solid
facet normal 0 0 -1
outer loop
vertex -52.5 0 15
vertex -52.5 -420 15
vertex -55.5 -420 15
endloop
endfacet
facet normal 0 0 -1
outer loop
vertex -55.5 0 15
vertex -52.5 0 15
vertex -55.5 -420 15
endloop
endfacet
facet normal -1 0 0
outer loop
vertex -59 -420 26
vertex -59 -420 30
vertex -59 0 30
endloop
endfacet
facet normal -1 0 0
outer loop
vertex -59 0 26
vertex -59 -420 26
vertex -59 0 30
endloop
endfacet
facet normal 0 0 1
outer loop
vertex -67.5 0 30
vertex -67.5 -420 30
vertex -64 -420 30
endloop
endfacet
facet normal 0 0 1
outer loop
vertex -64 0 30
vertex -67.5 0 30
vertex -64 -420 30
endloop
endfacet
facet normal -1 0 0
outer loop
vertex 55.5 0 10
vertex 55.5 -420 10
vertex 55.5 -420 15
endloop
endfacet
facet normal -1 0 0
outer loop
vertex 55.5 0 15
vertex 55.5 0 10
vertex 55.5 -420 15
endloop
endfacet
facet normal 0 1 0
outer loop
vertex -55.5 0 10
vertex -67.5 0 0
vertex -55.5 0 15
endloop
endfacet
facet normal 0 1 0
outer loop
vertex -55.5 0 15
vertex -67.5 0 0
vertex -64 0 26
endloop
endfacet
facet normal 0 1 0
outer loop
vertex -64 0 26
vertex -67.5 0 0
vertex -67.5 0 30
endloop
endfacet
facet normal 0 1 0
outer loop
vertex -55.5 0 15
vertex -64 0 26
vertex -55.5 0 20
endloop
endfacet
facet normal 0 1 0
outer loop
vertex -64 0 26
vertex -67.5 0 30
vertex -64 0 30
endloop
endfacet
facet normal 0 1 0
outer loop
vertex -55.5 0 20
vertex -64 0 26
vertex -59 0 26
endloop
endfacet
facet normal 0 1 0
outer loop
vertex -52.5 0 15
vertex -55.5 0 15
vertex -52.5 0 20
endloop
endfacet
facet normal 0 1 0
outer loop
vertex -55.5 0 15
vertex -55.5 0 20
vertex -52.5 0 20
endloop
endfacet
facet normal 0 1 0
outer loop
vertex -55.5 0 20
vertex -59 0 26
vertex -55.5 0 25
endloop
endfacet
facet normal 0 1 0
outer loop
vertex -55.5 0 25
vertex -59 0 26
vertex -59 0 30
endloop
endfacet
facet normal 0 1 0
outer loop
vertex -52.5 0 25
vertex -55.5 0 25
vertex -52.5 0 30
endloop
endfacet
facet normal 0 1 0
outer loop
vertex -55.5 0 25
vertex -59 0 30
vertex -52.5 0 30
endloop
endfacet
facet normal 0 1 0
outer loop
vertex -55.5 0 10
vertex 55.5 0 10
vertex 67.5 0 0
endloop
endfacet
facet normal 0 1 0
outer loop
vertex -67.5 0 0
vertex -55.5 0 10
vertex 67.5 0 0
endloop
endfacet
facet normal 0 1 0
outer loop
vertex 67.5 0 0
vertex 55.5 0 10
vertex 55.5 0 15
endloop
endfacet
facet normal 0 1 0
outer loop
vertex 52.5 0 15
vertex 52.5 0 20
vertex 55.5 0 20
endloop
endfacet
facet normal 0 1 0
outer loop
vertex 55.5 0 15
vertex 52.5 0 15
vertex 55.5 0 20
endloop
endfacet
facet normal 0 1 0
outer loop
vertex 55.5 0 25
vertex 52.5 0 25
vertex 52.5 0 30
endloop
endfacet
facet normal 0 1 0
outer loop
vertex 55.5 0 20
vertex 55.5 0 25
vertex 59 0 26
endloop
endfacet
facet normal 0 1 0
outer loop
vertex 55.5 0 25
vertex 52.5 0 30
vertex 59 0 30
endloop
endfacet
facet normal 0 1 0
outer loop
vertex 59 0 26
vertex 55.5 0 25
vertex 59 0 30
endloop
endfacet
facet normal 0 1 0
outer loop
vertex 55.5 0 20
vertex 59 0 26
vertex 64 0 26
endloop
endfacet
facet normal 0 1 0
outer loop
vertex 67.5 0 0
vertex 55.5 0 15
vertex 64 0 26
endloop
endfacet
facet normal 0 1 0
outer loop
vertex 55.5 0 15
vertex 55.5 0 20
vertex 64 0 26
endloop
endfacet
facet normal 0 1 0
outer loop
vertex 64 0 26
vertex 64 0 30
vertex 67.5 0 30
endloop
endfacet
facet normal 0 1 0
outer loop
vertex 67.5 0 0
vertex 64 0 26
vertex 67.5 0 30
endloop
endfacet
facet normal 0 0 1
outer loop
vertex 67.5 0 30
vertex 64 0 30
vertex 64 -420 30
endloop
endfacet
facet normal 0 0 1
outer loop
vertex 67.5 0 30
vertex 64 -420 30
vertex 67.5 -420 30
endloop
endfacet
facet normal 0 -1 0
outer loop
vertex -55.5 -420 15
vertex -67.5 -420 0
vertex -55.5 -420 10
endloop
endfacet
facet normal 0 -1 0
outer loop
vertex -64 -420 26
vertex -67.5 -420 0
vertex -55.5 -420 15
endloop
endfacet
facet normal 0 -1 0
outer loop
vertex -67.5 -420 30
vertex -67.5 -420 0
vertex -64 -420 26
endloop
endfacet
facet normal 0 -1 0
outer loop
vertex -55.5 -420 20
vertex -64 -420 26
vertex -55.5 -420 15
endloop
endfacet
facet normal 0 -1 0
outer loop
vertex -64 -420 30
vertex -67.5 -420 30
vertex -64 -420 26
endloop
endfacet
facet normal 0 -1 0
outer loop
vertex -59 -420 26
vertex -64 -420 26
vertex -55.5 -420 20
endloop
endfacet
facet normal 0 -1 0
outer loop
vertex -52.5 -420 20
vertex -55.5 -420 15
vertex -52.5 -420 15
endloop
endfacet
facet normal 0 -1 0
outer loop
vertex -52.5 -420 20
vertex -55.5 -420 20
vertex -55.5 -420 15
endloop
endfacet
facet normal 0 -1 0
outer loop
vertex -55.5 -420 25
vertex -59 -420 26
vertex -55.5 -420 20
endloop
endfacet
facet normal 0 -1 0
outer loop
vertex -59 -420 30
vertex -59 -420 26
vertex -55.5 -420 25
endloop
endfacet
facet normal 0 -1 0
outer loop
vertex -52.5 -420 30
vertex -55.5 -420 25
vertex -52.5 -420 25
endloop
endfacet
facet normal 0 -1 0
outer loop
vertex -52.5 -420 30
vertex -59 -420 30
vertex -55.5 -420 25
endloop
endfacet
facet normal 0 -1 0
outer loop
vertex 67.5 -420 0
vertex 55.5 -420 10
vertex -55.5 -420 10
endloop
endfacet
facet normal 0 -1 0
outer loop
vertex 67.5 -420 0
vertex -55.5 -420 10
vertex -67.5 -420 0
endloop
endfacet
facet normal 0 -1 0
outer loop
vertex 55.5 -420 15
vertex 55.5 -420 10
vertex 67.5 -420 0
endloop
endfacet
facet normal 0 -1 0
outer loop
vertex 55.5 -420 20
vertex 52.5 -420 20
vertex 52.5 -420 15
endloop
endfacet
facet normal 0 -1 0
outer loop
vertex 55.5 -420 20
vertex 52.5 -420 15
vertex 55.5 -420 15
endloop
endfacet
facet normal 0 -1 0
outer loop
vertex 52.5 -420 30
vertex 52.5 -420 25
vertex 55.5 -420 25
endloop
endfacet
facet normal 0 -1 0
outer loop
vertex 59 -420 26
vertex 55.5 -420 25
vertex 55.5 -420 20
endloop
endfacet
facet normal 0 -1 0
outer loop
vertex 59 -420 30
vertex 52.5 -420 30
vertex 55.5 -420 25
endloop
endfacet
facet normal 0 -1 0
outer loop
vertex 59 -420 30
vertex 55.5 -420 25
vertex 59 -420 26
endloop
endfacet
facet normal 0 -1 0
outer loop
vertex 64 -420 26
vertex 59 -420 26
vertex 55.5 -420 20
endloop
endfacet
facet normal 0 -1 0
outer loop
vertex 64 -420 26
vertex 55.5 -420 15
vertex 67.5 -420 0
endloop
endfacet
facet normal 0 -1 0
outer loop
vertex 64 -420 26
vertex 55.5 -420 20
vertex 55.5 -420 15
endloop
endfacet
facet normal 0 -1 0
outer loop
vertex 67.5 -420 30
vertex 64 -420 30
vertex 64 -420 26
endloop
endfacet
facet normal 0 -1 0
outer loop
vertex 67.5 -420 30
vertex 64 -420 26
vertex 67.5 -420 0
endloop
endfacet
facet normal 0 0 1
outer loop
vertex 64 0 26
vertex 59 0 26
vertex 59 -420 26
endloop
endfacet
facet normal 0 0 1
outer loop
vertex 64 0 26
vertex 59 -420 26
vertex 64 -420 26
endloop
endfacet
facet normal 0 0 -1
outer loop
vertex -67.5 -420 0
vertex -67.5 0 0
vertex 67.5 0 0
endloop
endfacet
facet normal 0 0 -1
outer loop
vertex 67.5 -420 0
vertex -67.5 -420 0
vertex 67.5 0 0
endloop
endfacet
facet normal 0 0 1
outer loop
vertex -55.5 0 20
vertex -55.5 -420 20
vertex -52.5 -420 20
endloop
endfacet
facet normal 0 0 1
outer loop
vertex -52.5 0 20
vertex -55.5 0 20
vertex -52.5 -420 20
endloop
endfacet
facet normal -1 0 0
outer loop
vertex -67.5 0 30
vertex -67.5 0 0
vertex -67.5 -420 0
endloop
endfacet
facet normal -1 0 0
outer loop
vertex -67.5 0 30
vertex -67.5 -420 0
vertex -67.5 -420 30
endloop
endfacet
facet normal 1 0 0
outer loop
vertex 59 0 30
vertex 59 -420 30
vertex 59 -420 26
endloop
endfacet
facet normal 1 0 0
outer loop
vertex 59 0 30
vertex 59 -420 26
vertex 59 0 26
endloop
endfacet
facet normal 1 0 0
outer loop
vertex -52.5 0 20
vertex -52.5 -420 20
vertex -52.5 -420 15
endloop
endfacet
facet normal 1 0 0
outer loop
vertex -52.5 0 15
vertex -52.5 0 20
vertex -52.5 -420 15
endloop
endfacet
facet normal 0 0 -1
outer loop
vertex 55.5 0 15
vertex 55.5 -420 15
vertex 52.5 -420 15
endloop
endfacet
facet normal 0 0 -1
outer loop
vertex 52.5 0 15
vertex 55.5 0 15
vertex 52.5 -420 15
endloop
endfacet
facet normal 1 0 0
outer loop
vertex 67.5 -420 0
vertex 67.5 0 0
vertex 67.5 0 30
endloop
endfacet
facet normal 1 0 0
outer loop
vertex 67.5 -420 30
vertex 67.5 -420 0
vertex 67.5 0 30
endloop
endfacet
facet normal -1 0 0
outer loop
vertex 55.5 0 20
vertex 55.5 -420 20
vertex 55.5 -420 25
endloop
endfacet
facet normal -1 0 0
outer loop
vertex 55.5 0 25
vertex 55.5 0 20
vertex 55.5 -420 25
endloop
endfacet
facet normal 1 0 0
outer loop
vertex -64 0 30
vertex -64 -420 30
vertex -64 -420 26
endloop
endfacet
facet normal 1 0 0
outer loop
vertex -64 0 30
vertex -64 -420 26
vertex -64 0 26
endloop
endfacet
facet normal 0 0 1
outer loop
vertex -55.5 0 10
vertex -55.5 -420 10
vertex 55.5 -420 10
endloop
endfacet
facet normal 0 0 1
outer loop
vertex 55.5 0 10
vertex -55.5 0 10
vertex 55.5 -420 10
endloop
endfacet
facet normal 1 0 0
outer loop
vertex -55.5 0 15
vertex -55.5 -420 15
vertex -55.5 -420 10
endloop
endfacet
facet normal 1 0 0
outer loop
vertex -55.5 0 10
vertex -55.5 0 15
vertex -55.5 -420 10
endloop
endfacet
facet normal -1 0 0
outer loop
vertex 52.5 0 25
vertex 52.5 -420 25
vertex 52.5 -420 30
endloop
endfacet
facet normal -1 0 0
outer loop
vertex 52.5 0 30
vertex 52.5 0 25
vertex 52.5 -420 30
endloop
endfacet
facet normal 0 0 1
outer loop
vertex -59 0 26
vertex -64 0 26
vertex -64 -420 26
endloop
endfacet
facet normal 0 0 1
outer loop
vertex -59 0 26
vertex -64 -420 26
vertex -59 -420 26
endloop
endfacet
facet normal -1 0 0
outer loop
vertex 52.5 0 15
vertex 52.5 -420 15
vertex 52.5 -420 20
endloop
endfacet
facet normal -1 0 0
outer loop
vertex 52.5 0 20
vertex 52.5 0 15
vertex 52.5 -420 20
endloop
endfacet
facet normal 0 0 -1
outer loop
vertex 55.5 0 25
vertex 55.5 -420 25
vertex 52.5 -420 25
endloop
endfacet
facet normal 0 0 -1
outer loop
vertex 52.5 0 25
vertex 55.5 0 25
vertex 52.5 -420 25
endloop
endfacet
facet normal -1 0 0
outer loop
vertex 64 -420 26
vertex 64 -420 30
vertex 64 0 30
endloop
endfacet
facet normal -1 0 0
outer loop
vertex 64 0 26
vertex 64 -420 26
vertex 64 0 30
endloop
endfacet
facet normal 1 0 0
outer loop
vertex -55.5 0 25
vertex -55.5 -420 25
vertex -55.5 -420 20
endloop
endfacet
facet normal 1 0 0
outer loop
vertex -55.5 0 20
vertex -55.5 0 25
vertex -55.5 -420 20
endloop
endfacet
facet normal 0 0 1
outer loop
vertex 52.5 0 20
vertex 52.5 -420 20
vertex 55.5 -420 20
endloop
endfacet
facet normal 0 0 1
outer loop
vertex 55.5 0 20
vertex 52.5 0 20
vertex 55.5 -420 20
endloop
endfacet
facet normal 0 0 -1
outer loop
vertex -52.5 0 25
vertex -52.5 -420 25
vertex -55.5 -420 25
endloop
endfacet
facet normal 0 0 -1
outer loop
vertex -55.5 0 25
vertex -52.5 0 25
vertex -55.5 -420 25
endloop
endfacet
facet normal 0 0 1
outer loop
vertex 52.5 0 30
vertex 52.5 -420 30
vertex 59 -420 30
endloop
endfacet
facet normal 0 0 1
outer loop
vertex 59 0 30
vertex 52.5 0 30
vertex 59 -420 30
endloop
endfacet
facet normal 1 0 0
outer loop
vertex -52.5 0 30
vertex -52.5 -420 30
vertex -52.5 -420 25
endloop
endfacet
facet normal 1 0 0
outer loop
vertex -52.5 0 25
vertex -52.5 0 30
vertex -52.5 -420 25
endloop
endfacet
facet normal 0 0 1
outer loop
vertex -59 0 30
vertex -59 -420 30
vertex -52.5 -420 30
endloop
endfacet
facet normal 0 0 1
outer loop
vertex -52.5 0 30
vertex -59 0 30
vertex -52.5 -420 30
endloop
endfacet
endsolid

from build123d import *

# Parameters (mm, degrees)
F0_W     = 135
F0_H     = 30
F1_DEPTH = 420
F3_DEPTH = 420
F4_W     = 5
F4_H     = 420
F5_DEPTH = 4


with BuildPart() as f1:
    # F0 (on Front) → F1 (new body)
    with BuildSketch(Plane.XZ):
        with Locations((0, 15)):
            Rectangle(F0_W, F0_H)
    extrude(amount=F1_DEPTH)

    # F2 (on face) → F3 (cut)
    with BuildSketch(Plane.XZ.offset(420)):
        Polygon((0, 30), (-52.5, 30), (-52.5, 25), (-55.5, 25), (-55.5, 20), (-52.5, 20), (-52.5, 15), (-55.5, 15), (-55.5, 10), (0, 10), (55.5, 10), (55.5, 15), (52.5, 15), (52.5, 20), (55.5, 20), (55.5, 25), (52.5, 25), (52.5, 30), align=None)
    extrude(amount=-F3_DEPTH, mode=Mode.SUBTRACT)

    # F4 (on face) → F5 (cut)
    with BuildSketch(Plane.XY.offset(30)):
        with Locations((-61.5, -210)):
            Rectangle(F4_W, F4_H)
        with Locations((61.5, -210)):
            Rectangle(F4_W, F4_H)
    extrude(amount=-F5_DEPTH, mode=Mode.SUBTRACT)


solid = f1.part
